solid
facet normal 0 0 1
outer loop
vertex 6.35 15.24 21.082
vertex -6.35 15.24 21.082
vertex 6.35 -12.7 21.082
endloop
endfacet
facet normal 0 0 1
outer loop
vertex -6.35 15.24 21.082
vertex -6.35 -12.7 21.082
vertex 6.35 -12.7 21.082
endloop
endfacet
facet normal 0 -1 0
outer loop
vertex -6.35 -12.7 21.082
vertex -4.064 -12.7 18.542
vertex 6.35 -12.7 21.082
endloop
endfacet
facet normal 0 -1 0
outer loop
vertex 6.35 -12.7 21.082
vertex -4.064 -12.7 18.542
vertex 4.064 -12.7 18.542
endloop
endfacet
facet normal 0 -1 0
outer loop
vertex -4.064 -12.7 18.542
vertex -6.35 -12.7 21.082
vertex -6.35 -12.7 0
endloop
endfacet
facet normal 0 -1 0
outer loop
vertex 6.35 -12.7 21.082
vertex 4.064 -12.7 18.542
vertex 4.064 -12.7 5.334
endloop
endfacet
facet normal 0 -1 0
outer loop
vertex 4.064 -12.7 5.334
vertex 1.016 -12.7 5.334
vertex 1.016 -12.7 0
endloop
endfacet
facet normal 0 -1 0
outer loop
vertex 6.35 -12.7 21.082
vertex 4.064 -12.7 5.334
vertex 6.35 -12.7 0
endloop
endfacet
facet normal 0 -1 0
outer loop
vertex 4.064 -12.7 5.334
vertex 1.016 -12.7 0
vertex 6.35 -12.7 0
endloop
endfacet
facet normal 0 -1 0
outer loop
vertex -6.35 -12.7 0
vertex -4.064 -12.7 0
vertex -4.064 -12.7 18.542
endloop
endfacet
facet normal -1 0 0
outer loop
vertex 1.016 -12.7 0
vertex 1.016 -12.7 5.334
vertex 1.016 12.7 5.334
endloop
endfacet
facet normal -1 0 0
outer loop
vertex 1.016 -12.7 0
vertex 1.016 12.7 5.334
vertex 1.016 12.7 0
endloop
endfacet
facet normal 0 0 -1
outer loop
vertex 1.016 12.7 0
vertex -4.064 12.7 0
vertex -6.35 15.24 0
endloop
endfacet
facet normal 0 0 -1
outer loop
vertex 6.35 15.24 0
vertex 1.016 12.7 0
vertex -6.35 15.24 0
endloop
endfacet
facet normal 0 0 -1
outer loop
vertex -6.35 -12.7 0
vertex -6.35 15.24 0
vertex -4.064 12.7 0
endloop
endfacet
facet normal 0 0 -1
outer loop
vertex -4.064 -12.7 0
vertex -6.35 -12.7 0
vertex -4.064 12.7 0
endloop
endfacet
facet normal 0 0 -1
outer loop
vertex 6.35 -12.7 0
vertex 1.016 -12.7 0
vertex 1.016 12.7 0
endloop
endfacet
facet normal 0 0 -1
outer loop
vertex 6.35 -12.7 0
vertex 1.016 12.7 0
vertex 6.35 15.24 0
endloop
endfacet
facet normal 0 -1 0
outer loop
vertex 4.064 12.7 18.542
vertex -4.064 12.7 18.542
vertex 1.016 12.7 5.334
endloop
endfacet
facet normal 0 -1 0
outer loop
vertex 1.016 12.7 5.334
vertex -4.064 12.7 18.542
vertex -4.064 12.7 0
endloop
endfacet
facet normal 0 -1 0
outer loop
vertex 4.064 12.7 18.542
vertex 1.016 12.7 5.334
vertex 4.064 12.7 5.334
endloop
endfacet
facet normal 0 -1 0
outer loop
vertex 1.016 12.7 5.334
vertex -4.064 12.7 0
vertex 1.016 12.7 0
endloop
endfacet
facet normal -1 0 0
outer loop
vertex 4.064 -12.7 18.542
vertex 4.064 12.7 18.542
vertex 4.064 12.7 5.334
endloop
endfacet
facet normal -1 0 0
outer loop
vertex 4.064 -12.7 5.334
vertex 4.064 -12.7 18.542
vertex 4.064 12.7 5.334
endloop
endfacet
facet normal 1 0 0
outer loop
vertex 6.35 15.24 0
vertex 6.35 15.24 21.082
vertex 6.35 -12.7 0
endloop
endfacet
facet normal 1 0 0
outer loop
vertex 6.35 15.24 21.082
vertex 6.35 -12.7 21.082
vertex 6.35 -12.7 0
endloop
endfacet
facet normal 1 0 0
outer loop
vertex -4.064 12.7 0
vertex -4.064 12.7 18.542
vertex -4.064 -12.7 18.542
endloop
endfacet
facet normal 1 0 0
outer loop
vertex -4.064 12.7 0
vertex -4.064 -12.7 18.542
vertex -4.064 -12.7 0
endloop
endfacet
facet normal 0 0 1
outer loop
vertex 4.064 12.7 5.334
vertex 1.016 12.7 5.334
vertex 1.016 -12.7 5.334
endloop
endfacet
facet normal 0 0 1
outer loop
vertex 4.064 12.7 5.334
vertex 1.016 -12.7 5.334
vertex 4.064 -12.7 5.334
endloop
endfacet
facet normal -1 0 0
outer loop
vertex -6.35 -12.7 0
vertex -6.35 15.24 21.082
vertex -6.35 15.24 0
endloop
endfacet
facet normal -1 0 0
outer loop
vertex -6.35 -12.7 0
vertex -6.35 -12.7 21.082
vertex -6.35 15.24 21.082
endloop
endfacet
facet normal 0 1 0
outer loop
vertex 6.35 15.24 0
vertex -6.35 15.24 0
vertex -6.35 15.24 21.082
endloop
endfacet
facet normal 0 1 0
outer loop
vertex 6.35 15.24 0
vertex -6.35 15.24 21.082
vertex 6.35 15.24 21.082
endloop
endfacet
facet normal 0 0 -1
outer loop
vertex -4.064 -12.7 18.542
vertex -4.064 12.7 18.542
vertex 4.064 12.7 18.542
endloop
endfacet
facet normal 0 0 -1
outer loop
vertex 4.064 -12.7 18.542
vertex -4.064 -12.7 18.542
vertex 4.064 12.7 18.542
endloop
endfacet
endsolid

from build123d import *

# Parameters (mm, degrees)
SKETCH1_W           = 12.7
SKETCH1_H           = 25.4
BOSS_EXTRUDE1_DEPTH = 21.082
SKETCH3_W           = 8.128
SKETCH3_H           = 13.208
CUT_EXTRUDE2_DEPTH  = 27.94
SKETCH4_W           = 5.08
SKETCH4_H           = 5.334
CUT_EXTRUDE3_DEPTH  = 27.94
SKETCH5_W           = 12.7
SKETCH5_H           = 21.082
BOSS_EXTRUDE2_DEPTH = 2.54


with BuildPart() as part:
    # Sketch1 → Boss-Extrude1 (new body)
    with BuildSketch(Plane.XY):
        Rectangle(SKETCH1_W, SKETCH1_H)
    extrude(amount=BOSS_EXTRUDE1_DEPTH)

    # Sketch3 → Cut-Extrude2 (cut)
    with BuildSketch(Plane(origin=(0, 12.7, 0), x_dir=(1, 0, 0), z_dir=(0, 1, 0))):
        with Locations((0, -11.938)):
            Rectangle(SKETCH3_W, SKETCH3_H)
    extrude(amount=-CUT_EXTRUDE2_DEPTH, mode=Mode.SUBTRACT)

    # Sketch4 → Cut-Extrude3 (cut)
    with BuildSketch(Plane(origin=(0, 12.7, 0), x_dir=(1, 0, 0), z_dir=(0, 1, 0))):
        with Locations((-1.524, -2.667)):
            Rectangle(SKETCH4_W, SKETCH4_H)
    extrude(amount=-CUT_EXTRUDE3_DEPTH, mode=Mode.SUBTRACT)

    # Sketch5 → Boss-Extrude2 (add)
    with BuildSketch(Plane(origin=(0, 12.7, 0), x_dir=(1, 0, 0), z_dir=(0, 1, 0))):
        with Locations((0, -10.541)):
            Rectangle(SKETCH5_W, SKETCH5_H)
    extrude(amount=BOSS_EXTRUDE2_DEPTH)


solid = part.part
